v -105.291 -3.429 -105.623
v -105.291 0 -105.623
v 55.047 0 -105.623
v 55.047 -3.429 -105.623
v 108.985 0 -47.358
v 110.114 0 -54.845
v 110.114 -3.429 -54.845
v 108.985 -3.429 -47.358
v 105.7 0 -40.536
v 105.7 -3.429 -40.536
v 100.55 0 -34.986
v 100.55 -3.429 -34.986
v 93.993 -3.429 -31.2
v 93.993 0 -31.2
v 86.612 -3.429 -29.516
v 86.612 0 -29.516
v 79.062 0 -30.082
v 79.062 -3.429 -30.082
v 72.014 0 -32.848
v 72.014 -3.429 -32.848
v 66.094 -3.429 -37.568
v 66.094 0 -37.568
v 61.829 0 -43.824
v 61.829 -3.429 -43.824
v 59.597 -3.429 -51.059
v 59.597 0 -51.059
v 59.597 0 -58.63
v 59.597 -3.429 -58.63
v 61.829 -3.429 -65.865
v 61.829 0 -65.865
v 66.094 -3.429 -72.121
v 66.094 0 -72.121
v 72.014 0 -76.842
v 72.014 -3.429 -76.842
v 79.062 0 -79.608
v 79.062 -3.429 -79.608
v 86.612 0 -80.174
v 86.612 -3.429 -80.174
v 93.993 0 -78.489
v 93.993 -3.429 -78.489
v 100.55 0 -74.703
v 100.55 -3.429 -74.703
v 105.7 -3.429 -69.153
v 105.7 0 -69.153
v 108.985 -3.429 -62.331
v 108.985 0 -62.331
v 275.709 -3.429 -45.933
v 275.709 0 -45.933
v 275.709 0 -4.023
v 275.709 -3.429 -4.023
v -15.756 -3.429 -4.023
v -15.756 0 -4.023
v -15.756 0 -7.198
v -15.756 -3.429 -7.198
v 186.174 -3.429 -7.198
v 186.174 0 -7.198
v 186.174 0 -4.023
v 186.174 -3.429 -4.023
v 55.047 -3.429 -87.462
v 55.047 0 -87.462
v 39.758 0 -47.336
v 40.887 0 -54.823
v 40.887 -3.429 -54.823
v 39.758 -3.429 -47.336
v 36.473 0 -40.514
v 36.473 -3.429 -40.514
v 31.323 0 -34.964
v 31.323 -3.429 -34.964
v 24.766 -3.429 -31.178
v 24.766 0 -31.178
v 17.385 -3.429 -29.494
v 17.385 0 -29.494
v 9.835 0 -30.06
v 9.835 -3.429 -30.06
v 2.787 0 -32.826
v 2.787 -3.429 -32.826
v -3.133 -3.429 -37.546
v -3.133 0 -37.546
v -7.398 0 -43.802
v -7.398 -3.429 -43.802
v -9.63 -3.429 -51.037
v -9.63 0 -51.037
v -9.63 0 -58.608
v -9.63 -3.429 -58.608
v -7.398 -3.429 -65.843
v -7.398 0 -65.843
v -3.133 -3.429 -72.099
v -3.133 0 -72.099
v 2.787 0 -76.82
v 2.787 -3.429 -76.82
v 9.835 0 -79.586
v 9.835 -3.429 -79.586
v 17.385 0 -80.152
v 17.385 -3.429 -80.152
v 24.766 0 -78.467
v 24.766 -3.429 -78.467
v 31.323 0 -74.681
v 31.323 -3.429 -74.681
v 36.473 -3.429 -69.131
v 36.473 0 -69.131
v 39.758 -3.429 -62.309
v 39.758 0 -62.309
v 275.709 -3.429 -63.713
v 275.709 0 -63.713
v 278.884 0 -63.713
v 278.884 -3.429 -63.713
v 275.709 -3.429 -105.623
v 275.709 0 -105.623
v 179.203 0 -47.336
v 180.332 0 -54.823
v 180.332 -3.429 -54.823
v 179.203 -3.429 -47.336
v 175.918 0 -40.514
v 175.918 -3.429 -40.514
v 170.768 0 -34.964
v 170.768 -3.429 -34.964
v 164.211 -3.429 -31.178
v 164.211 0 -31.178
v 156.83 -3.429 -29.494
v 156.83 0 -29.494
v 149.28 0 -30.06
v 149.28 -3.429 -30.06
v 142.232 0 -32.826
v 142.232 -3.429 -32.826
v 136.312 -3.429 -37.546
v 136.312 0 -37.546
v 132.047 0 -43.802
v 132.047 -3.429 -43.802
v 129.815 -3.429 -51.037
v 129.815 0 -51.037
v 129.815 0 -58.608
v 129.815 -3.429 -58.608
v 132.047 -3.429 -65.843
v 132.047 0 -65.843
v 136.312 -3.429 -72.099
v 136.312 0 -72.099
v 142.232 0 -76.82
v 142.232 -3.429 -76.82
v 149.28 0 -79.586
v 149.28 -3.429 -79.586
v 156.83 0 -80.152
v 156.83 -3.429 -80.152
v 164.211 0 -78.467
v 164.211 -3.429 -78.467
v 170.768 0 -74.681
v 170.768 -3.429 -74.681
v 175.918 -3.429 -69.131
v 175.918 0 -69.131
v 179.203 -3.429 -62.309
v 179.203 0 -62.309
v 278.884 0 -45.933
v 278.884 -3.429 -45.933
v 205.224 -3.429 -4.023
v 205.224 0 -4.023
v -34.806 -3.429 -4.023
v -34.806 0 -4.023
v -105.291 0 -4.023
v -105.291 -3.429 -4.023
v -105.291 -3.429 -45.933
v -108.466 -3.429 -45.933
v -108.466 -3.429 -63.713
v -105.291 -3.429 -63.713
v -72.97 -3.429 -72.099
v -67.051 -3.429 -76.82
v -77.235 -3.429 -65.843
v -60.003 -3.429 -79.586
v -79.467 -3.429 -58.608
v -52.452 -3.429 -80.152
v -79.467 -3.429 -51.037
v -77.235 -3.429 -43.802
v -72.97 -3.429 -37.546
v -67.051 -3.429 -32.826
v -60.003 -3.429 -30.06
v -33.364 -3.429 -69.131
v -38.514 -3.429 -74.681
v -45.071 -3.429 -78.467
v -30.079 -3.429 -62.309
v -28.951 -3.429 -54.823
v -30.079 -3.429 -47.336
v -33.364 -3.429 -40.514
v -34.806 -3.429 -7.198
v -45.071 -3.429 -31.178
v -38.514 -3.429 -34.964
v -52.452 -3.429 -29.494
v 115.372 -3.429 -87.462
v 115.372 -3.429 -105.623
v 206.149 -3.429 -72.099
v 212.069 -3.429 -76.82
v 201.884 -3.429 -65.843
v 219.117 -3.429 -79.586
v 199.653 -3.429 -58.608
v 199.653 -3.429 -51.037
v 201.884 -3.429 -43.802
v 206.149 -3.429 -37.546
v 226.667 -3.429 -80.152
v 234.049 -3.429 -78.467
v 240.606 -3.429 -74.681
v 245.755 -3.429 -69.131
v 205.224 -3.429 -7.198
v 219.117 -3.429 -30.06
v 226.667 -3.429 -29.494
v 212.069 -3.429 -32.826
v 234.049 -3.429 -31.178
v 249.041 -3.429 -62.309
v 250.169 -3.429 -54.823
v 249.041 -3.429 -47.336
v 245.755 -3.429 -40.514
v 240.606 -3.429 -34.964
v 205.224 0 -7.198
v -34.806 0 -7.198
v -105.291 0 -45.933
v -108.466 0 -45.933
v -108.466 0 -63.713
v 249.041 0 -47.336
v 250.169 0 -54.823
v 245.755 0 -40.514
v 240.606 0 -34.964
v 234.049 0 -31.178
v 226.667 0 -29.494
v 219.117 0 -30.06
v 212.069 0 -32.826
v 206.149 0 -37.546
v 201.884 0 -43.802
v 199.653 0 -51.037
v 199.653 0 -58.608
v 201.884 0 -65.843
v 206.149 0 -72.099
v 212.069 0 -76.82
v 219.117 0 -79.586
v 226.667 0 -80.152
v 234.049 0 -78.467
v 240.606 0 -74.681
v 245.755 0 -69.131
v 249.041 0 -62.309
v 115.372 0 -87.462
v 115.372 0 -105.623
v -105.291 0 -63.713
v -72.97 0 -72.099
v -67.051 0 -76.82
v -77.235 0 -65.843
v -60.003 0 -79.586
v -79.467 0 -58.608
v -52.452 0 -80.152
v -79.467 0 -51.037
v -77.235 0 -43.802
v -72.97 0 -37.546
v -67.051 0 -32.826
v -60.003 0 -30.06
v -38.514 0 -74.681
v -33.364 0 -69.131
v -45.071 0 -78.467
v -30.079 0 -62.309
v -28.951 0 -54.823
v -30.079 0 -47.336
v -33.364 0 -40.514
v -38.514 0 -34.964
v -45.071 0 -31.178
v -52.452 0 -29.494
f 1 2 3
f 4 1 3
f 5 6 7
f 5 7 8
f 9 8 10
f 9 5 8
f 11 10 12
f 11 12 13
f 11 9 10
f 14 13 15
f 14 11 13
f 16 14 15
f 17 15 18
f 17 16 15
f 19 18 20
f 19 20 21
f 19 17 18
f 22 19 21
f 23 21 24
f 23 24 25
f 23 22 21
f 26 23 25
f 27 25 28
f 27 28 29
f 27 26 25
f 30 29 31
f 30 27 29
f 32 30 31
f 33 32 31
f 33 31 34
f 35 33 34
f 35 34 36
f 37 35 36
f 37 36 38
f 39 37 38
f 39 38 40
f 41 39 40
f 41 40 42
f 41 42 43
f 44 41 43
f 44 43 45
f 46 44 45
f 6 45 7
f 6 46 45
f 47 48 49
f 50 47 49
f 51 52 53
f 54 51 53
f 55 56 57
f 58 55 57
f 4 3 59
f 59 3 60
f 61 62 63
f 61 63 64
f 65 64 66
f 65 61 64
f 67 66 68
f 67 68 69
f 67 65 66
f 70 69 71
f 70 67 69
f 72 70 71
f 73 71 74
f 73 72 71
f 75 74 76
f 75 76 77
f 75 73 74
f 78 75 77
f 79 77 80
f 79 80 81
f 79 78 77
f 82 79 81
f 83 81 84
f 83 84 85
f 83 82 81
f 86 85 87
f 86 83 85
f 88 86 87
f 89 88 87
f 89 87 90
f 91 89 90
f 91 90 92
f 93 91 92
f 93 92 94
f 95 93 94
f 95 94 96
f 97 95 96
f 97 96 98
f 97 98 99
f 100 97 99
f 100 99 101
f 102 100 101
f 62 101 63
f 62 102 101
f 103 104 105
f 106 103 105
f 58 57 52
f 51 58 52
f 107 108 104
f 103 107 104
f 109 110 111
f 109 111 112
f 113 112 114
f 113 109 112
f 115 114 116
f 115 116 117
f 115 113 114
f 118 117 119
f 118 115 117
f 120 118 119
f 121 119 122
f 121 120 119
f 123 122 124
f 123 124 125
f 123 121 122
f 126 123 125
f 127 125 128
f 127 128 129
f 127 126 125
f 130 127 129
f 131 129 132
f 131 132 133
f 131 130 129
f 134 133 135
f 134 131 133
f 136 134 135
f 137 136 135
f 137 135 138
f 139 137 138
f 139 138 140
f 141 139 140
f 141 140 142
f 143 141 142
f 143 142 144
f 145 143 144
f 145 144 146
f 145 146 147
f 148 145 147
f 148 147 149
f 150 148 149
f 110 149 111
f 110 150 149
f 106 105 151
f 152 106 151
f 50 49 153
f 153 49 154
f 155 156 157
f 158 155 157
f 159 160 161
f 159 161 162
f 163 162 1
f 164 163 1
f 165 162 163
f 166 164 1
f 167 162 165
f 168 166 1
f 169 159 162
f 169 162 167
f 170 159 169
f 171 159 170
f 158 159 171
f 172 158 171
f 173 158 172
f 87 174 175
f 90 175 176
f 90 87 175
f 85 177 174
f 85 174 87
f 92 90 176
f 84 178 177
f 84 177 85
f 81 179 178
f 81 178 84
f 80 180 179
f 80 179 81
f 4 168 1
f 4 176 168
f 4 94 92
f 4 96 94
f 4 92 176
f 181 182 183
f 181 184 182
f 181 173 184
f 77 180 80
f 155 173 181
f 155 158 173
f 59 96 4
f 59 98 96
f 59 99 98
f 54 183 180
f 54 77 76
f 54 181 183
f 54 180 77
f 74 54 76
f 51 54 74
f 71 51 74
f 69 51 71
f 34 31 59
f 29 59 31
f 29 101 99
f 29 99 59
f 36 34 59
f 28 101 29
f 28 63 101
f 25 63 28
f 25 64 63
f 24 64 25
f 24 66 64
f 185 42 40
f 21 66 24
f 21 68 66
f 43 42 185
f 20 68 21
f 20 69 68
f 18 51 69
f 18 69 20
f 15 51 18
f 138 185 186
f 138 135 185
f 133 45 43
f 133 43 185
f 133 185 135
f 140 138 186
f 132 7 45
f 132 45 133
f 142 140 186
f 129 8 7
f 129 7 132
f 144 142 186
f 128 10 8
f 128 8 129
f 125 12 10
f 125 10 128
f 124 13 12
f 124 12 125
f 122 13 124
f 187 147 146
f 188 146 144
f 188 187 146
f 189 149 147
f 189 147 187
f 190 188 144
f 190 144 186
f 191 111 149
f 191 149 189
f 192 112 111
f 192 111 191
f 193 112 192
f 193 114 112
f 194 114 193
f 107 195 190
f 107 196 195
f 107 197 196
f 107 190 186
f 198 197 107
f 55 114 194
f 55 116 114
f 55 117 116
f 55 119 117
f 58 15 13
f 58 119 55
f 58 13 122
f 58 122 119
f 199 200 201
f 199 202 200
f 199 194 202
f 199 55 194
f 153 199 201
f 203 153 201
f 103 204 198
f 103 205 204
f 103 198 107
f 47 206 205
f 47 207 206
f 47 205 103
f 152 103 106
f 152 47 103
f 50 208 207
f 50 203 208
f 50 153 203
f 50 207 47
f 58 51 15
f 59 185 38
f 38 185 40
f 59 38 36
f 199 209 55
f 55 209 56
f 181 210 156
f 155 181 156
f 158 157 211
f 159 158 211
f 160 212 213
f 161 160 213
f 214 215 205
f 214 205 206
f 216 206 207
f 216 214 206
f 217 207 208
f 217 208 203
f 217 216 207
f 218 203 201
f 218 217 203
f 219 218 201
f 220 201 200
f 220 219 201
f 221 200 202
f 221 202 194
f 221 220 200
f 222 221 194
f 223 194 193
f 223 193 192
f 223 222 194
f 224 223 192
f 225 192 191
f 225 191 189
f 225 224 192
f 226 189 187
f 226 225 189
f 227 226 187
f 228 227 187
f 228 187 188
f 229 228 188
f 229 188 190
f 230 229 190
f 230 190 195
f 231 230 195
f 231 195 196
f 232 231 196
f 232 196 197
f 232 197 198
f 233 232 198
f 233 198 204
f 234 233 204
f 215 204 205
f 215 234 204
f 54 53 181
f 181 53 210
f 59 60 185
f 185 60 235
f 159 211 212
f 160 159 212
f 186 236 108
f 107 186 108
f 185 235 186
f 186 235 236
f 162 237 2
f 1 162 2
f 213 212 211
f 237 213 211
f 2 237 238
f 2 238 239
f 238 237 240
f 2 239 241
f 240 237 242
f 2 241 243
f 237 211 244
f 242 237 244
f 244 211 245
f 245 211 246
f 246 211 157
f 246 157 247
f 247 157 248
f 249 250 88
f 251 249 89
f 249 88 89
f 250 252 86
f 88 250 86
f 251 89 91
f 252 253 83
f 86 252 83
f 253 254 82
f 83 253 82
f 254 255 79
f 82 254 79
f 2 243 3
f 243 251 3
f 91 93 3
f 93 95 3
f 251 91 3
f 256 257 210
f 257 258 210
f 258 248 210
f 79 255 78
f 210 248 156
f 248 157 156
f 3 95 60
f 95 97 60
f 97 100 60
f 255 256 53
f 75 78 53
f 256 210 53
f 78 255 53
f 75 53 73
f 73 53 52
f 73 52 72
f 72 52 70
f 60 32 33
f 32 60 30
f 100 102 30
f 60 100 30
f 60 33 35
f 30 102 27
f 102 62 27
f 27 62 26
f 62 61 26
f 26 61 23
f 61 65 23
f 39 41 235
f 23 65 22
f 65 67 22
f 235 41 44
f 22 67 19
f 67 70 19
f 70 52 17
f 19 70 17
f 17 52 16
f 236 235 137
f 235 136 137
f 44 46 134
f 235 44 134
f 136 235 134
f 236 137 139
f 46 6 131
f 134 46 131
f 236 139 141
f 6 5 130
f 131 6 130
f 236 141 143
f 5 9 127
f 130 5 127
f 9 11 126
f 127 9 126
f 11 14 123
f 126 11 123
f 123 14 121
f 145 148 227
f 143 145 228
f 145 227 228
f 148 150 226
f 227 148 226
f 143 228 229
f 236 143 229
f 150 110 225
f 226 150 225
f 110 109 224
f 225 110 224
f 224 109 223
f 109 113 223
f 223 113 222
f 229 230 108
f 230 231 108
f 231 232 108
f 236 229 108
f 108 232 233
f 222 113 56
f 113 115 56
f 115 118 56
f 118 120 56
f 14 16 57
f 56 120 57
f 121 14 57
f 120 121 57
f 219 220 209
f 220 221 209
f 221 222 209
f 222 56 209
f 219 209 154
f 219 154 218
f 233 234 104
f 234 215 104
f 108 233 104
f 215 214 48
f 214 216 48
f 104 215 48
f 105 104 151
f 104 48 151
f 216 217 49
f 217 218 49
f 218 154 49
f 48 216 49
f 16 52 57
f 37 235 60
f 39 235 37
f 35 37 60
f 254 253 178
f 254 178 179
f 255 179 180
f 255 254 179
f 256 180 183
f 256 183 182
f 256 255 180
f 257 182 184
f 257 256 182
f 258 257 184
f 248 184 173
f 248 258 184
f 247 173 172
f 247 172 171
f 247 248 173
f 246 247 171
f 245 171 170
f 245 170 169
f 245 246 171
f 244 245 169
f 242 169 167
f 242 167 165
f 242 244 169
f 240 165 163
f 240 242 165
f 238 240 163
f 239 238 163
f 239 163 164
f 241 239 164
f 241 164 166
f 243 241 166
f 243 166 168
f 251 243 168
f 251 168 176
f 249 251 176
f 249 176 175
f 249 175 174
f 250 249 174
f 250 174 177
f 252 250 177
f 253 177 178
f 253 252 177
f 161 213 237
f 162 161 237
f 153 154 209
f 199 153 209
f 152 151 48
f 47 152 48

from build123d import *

# Parameters (mm, degrees)
F0_R     = 25.4
F1_DEPTH = 3.429


with BuildPart() as f1:
    # F0 (on Front) → F1 (new body)
    with BuildSketch(Plane.XZ):
        Polygon((205.224228, -4.022674), (205.224228, -7.197674), (186.174228, -7.197674), (186.174228, -4.022674), (-15.755772, -4.022674), (-15.755772, -7.197674), (-34.805772, -7.197674), (-34.805772, -4.022674), (-105.290772, -4.022674), (-105.290772, -45.932674), (-108.465772, -45.932674), (-108.465772, -63.712674), (-105.290772, -63.712674), (-105.290772, -105.622674), (55.046728, -105.622674), (55.046728, -87.461674), (115.371728, -87.461674), (115.371728, -105.622674), (275.709228, -105.622674), (275.709228, -63.712674), (278.884228, -63.712674), (278.884228, -45.932674), (275.709228, -45.932674), (275.709228, -4.022674), align=None)
        with Locations((84.713775, -54.844671)):
            Circle(F0_R, mode=Mode.SUBTRACT)
        with Locations((-54.350514, -54.822674)):
            Circle(F0_R, mode=Mode.SUBTRACT)
        with Locations((15.486786, -54.822674)):
            Circle(F0_R, mode=Mode.SUBTRACT)
        with Locations((154.931694, -54.822674)):
            Circle(F0_R, mode=Mode.SUBTRACT)
        with Locations((224.768994, -54.822674)):
            Circle(F0_R, mode=Mode.SUBTRACT)
    extrude(amount=F1_DEPTH)


solid = f1.part
